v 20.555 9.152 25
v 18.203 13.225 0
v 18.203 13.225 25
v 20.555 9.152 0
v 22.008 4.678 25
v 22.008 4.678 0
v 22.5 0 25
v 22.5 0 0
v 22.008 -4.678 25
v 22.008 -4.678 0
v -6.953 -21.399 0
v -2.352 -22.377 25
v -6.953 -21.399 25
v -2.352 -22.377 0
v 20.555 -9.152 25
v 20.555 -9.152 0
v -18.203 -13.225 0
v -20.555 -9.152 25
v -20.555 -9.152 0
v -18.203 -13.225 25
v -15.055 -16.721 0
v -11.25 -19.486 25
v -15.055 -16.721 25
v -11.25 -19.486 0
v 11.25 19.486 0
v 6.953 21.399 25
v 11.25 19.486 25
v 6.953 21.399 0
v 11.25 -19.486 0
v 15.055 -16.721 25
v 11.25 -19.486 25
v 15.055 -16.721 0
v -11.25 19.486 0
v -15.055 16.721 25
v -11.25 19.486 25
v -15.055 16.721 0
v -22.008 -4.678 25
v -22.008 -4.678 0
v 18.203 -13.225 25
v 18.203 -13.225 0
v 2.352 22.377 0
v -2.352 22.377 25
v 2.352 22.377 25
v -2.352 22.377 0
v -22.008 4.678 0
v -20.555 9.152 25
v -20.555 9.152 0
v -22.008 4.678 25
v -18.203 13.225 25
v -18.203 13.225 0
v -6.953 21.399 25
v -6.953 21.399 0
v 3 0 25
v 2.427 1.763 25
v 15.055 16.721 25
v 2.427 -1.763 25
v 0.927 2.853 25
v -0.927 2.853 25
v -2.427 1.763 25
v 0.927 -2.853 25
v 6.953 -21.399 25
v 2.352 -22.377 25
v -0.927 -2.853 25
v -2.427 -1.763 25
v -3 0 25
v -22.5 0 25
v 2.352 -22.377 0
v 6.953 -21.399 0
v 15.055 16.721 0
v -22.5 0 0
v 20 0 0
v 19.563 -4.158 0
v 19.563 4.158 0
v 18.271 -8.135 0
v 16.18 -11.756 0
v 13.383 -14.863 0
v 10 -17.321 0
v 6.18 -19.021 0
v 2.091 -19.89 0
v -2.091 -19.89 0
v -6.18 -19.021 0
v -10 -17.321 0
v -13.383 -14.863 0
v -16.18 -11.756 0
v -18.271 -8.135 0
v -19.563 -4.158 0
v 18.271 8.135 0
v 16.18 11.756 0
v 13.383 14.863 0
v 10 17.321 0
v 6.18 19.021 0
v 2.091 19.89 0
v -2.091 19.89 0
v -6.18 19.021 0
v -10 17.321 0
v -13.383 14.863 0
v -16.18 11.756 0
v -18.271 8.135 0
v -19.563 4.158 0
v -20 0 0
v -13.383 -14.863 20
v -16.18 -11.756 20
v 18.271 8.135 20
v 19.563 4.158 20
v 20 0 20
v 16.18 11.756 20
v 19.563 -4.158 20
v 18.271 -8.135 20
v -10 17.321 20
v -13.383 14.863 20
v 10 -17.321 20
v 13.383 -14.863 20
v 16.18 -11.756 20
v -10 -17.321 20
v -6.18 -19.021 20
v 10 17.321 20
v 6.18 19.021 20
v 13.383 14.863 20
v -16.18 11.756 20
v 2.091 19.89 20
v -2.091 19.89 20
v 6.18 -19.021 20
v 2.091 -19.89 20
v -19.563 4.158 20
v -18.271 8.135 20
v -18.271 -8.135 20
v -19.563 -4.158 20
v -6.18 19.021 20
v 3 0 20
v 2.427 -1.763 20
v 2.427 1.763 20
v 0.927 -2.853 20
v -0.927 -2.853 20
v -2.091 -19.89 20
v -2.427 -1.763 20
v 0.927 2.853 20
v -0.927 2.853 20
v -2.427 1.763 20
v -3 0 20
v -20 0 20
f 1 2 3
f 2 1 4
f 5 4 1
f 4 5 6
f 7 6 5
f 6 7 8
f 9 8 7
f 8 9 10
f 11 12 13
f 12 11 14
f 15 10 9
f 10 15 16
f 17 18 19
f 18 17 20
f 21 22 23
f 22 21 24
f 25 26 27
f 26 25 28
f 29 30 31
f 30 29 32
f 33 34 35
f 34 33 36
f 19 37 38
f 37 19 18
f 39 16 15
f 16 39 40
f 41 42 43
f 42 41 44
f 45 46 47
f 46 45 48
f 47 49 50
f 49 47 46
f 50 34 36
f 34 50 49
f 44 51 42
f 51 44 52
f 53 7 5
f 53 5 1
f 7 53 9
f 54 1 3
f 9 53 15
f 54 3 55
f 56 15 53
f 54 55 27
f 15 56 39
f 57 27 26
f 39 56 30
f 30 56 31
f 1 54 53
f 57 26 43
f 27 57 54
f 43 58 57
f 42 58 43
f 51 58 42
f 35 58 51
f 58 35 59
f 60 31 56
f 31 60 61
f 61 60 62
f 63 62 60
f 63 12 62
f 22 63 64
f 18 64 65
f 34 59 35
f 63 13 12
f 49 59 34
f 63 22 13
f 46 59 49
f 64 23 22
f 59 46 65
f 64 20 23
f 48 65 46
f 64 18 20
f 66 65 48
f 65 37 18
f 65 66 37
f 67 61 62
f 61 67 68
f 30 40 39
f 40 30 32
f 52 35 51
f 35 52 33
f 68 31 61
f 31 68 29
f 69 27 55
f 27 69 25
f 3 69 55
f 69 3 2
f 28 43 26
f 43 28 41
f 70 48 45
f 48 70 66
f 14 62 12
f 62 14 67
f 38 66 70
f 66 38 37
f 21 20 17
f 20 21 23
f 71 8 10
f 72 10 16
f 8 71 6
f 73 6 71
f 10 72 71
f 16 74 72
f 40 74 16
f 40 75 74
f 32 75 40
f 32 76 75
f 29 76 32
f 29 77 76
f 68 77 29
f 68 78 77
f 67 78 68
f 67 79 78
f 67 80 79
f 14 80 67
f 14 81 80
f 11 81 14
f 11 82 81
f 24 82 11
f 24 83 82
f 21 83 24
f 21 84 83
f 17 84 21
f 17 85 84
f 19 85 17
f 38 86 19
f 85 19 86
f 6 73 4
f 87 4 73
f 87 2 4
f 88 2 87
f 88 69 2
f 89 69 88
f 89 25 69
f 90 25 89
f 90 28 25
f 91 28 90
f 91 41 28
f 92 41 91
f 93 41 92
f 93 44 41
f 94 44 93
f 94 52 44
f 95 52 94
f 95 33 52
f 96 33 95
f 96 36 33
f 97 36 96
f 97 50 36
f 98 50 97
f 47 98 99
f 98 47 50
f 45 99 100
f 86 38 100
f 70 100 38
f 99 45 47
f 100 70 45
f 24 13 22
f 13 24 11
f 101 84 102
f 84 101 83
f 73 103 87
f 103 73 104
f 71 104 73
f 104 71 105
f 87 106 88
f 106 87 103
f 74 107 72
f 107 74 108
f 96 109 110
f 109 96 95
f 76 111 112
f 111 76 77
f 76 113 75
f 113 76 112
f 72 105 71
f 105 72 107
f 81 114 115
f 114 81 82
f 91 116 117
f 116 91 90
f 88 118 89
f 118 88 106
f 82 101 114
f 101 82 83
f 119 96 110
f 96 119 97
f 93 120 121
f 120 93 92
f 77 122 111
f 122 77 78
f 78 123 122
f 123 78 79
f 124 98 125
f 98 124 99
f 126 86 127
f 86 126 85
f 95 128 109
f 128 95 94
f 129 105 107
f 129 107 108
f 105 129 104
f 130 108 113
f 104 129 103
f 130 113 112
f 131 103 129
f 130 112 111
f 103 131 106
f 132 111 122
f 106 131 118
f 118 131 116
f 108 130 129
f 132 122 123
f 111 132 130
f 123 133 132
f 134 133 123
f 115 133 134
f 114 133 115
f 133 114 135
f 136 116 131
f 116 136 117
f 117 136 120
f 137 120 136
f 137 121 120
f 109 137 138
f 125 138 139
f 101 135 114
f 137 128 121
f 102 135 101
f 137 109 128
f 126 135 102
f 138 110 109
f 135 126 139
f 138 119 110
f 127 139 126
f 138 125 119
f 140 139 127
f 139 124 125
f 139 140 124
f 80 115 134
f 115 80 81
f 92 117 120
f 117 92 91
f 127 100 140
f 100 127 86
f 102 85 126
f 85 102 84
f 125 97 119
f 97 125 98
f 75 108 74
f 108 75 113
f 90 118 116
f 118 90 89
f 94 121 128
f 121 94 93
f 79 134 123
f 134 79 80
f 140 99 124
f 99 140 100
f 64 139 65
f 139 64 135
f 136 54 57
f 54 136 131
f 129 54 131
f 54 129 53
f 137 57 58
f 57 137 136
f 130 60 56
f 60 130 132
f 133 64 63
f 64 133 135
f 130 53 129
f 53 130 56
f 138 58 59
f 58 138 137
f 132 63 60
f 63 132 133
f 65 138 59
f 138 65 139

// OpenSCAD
od = 45;
id = 40;
hd = 6;

base_h = 5;
cup_h = 20;

difference() {
cylinder(d=od, h=base_h+cup_h);
cylinder(d=id, h=cup_h);
cylinder(d=hd, h=base_h+cup_h);
}
